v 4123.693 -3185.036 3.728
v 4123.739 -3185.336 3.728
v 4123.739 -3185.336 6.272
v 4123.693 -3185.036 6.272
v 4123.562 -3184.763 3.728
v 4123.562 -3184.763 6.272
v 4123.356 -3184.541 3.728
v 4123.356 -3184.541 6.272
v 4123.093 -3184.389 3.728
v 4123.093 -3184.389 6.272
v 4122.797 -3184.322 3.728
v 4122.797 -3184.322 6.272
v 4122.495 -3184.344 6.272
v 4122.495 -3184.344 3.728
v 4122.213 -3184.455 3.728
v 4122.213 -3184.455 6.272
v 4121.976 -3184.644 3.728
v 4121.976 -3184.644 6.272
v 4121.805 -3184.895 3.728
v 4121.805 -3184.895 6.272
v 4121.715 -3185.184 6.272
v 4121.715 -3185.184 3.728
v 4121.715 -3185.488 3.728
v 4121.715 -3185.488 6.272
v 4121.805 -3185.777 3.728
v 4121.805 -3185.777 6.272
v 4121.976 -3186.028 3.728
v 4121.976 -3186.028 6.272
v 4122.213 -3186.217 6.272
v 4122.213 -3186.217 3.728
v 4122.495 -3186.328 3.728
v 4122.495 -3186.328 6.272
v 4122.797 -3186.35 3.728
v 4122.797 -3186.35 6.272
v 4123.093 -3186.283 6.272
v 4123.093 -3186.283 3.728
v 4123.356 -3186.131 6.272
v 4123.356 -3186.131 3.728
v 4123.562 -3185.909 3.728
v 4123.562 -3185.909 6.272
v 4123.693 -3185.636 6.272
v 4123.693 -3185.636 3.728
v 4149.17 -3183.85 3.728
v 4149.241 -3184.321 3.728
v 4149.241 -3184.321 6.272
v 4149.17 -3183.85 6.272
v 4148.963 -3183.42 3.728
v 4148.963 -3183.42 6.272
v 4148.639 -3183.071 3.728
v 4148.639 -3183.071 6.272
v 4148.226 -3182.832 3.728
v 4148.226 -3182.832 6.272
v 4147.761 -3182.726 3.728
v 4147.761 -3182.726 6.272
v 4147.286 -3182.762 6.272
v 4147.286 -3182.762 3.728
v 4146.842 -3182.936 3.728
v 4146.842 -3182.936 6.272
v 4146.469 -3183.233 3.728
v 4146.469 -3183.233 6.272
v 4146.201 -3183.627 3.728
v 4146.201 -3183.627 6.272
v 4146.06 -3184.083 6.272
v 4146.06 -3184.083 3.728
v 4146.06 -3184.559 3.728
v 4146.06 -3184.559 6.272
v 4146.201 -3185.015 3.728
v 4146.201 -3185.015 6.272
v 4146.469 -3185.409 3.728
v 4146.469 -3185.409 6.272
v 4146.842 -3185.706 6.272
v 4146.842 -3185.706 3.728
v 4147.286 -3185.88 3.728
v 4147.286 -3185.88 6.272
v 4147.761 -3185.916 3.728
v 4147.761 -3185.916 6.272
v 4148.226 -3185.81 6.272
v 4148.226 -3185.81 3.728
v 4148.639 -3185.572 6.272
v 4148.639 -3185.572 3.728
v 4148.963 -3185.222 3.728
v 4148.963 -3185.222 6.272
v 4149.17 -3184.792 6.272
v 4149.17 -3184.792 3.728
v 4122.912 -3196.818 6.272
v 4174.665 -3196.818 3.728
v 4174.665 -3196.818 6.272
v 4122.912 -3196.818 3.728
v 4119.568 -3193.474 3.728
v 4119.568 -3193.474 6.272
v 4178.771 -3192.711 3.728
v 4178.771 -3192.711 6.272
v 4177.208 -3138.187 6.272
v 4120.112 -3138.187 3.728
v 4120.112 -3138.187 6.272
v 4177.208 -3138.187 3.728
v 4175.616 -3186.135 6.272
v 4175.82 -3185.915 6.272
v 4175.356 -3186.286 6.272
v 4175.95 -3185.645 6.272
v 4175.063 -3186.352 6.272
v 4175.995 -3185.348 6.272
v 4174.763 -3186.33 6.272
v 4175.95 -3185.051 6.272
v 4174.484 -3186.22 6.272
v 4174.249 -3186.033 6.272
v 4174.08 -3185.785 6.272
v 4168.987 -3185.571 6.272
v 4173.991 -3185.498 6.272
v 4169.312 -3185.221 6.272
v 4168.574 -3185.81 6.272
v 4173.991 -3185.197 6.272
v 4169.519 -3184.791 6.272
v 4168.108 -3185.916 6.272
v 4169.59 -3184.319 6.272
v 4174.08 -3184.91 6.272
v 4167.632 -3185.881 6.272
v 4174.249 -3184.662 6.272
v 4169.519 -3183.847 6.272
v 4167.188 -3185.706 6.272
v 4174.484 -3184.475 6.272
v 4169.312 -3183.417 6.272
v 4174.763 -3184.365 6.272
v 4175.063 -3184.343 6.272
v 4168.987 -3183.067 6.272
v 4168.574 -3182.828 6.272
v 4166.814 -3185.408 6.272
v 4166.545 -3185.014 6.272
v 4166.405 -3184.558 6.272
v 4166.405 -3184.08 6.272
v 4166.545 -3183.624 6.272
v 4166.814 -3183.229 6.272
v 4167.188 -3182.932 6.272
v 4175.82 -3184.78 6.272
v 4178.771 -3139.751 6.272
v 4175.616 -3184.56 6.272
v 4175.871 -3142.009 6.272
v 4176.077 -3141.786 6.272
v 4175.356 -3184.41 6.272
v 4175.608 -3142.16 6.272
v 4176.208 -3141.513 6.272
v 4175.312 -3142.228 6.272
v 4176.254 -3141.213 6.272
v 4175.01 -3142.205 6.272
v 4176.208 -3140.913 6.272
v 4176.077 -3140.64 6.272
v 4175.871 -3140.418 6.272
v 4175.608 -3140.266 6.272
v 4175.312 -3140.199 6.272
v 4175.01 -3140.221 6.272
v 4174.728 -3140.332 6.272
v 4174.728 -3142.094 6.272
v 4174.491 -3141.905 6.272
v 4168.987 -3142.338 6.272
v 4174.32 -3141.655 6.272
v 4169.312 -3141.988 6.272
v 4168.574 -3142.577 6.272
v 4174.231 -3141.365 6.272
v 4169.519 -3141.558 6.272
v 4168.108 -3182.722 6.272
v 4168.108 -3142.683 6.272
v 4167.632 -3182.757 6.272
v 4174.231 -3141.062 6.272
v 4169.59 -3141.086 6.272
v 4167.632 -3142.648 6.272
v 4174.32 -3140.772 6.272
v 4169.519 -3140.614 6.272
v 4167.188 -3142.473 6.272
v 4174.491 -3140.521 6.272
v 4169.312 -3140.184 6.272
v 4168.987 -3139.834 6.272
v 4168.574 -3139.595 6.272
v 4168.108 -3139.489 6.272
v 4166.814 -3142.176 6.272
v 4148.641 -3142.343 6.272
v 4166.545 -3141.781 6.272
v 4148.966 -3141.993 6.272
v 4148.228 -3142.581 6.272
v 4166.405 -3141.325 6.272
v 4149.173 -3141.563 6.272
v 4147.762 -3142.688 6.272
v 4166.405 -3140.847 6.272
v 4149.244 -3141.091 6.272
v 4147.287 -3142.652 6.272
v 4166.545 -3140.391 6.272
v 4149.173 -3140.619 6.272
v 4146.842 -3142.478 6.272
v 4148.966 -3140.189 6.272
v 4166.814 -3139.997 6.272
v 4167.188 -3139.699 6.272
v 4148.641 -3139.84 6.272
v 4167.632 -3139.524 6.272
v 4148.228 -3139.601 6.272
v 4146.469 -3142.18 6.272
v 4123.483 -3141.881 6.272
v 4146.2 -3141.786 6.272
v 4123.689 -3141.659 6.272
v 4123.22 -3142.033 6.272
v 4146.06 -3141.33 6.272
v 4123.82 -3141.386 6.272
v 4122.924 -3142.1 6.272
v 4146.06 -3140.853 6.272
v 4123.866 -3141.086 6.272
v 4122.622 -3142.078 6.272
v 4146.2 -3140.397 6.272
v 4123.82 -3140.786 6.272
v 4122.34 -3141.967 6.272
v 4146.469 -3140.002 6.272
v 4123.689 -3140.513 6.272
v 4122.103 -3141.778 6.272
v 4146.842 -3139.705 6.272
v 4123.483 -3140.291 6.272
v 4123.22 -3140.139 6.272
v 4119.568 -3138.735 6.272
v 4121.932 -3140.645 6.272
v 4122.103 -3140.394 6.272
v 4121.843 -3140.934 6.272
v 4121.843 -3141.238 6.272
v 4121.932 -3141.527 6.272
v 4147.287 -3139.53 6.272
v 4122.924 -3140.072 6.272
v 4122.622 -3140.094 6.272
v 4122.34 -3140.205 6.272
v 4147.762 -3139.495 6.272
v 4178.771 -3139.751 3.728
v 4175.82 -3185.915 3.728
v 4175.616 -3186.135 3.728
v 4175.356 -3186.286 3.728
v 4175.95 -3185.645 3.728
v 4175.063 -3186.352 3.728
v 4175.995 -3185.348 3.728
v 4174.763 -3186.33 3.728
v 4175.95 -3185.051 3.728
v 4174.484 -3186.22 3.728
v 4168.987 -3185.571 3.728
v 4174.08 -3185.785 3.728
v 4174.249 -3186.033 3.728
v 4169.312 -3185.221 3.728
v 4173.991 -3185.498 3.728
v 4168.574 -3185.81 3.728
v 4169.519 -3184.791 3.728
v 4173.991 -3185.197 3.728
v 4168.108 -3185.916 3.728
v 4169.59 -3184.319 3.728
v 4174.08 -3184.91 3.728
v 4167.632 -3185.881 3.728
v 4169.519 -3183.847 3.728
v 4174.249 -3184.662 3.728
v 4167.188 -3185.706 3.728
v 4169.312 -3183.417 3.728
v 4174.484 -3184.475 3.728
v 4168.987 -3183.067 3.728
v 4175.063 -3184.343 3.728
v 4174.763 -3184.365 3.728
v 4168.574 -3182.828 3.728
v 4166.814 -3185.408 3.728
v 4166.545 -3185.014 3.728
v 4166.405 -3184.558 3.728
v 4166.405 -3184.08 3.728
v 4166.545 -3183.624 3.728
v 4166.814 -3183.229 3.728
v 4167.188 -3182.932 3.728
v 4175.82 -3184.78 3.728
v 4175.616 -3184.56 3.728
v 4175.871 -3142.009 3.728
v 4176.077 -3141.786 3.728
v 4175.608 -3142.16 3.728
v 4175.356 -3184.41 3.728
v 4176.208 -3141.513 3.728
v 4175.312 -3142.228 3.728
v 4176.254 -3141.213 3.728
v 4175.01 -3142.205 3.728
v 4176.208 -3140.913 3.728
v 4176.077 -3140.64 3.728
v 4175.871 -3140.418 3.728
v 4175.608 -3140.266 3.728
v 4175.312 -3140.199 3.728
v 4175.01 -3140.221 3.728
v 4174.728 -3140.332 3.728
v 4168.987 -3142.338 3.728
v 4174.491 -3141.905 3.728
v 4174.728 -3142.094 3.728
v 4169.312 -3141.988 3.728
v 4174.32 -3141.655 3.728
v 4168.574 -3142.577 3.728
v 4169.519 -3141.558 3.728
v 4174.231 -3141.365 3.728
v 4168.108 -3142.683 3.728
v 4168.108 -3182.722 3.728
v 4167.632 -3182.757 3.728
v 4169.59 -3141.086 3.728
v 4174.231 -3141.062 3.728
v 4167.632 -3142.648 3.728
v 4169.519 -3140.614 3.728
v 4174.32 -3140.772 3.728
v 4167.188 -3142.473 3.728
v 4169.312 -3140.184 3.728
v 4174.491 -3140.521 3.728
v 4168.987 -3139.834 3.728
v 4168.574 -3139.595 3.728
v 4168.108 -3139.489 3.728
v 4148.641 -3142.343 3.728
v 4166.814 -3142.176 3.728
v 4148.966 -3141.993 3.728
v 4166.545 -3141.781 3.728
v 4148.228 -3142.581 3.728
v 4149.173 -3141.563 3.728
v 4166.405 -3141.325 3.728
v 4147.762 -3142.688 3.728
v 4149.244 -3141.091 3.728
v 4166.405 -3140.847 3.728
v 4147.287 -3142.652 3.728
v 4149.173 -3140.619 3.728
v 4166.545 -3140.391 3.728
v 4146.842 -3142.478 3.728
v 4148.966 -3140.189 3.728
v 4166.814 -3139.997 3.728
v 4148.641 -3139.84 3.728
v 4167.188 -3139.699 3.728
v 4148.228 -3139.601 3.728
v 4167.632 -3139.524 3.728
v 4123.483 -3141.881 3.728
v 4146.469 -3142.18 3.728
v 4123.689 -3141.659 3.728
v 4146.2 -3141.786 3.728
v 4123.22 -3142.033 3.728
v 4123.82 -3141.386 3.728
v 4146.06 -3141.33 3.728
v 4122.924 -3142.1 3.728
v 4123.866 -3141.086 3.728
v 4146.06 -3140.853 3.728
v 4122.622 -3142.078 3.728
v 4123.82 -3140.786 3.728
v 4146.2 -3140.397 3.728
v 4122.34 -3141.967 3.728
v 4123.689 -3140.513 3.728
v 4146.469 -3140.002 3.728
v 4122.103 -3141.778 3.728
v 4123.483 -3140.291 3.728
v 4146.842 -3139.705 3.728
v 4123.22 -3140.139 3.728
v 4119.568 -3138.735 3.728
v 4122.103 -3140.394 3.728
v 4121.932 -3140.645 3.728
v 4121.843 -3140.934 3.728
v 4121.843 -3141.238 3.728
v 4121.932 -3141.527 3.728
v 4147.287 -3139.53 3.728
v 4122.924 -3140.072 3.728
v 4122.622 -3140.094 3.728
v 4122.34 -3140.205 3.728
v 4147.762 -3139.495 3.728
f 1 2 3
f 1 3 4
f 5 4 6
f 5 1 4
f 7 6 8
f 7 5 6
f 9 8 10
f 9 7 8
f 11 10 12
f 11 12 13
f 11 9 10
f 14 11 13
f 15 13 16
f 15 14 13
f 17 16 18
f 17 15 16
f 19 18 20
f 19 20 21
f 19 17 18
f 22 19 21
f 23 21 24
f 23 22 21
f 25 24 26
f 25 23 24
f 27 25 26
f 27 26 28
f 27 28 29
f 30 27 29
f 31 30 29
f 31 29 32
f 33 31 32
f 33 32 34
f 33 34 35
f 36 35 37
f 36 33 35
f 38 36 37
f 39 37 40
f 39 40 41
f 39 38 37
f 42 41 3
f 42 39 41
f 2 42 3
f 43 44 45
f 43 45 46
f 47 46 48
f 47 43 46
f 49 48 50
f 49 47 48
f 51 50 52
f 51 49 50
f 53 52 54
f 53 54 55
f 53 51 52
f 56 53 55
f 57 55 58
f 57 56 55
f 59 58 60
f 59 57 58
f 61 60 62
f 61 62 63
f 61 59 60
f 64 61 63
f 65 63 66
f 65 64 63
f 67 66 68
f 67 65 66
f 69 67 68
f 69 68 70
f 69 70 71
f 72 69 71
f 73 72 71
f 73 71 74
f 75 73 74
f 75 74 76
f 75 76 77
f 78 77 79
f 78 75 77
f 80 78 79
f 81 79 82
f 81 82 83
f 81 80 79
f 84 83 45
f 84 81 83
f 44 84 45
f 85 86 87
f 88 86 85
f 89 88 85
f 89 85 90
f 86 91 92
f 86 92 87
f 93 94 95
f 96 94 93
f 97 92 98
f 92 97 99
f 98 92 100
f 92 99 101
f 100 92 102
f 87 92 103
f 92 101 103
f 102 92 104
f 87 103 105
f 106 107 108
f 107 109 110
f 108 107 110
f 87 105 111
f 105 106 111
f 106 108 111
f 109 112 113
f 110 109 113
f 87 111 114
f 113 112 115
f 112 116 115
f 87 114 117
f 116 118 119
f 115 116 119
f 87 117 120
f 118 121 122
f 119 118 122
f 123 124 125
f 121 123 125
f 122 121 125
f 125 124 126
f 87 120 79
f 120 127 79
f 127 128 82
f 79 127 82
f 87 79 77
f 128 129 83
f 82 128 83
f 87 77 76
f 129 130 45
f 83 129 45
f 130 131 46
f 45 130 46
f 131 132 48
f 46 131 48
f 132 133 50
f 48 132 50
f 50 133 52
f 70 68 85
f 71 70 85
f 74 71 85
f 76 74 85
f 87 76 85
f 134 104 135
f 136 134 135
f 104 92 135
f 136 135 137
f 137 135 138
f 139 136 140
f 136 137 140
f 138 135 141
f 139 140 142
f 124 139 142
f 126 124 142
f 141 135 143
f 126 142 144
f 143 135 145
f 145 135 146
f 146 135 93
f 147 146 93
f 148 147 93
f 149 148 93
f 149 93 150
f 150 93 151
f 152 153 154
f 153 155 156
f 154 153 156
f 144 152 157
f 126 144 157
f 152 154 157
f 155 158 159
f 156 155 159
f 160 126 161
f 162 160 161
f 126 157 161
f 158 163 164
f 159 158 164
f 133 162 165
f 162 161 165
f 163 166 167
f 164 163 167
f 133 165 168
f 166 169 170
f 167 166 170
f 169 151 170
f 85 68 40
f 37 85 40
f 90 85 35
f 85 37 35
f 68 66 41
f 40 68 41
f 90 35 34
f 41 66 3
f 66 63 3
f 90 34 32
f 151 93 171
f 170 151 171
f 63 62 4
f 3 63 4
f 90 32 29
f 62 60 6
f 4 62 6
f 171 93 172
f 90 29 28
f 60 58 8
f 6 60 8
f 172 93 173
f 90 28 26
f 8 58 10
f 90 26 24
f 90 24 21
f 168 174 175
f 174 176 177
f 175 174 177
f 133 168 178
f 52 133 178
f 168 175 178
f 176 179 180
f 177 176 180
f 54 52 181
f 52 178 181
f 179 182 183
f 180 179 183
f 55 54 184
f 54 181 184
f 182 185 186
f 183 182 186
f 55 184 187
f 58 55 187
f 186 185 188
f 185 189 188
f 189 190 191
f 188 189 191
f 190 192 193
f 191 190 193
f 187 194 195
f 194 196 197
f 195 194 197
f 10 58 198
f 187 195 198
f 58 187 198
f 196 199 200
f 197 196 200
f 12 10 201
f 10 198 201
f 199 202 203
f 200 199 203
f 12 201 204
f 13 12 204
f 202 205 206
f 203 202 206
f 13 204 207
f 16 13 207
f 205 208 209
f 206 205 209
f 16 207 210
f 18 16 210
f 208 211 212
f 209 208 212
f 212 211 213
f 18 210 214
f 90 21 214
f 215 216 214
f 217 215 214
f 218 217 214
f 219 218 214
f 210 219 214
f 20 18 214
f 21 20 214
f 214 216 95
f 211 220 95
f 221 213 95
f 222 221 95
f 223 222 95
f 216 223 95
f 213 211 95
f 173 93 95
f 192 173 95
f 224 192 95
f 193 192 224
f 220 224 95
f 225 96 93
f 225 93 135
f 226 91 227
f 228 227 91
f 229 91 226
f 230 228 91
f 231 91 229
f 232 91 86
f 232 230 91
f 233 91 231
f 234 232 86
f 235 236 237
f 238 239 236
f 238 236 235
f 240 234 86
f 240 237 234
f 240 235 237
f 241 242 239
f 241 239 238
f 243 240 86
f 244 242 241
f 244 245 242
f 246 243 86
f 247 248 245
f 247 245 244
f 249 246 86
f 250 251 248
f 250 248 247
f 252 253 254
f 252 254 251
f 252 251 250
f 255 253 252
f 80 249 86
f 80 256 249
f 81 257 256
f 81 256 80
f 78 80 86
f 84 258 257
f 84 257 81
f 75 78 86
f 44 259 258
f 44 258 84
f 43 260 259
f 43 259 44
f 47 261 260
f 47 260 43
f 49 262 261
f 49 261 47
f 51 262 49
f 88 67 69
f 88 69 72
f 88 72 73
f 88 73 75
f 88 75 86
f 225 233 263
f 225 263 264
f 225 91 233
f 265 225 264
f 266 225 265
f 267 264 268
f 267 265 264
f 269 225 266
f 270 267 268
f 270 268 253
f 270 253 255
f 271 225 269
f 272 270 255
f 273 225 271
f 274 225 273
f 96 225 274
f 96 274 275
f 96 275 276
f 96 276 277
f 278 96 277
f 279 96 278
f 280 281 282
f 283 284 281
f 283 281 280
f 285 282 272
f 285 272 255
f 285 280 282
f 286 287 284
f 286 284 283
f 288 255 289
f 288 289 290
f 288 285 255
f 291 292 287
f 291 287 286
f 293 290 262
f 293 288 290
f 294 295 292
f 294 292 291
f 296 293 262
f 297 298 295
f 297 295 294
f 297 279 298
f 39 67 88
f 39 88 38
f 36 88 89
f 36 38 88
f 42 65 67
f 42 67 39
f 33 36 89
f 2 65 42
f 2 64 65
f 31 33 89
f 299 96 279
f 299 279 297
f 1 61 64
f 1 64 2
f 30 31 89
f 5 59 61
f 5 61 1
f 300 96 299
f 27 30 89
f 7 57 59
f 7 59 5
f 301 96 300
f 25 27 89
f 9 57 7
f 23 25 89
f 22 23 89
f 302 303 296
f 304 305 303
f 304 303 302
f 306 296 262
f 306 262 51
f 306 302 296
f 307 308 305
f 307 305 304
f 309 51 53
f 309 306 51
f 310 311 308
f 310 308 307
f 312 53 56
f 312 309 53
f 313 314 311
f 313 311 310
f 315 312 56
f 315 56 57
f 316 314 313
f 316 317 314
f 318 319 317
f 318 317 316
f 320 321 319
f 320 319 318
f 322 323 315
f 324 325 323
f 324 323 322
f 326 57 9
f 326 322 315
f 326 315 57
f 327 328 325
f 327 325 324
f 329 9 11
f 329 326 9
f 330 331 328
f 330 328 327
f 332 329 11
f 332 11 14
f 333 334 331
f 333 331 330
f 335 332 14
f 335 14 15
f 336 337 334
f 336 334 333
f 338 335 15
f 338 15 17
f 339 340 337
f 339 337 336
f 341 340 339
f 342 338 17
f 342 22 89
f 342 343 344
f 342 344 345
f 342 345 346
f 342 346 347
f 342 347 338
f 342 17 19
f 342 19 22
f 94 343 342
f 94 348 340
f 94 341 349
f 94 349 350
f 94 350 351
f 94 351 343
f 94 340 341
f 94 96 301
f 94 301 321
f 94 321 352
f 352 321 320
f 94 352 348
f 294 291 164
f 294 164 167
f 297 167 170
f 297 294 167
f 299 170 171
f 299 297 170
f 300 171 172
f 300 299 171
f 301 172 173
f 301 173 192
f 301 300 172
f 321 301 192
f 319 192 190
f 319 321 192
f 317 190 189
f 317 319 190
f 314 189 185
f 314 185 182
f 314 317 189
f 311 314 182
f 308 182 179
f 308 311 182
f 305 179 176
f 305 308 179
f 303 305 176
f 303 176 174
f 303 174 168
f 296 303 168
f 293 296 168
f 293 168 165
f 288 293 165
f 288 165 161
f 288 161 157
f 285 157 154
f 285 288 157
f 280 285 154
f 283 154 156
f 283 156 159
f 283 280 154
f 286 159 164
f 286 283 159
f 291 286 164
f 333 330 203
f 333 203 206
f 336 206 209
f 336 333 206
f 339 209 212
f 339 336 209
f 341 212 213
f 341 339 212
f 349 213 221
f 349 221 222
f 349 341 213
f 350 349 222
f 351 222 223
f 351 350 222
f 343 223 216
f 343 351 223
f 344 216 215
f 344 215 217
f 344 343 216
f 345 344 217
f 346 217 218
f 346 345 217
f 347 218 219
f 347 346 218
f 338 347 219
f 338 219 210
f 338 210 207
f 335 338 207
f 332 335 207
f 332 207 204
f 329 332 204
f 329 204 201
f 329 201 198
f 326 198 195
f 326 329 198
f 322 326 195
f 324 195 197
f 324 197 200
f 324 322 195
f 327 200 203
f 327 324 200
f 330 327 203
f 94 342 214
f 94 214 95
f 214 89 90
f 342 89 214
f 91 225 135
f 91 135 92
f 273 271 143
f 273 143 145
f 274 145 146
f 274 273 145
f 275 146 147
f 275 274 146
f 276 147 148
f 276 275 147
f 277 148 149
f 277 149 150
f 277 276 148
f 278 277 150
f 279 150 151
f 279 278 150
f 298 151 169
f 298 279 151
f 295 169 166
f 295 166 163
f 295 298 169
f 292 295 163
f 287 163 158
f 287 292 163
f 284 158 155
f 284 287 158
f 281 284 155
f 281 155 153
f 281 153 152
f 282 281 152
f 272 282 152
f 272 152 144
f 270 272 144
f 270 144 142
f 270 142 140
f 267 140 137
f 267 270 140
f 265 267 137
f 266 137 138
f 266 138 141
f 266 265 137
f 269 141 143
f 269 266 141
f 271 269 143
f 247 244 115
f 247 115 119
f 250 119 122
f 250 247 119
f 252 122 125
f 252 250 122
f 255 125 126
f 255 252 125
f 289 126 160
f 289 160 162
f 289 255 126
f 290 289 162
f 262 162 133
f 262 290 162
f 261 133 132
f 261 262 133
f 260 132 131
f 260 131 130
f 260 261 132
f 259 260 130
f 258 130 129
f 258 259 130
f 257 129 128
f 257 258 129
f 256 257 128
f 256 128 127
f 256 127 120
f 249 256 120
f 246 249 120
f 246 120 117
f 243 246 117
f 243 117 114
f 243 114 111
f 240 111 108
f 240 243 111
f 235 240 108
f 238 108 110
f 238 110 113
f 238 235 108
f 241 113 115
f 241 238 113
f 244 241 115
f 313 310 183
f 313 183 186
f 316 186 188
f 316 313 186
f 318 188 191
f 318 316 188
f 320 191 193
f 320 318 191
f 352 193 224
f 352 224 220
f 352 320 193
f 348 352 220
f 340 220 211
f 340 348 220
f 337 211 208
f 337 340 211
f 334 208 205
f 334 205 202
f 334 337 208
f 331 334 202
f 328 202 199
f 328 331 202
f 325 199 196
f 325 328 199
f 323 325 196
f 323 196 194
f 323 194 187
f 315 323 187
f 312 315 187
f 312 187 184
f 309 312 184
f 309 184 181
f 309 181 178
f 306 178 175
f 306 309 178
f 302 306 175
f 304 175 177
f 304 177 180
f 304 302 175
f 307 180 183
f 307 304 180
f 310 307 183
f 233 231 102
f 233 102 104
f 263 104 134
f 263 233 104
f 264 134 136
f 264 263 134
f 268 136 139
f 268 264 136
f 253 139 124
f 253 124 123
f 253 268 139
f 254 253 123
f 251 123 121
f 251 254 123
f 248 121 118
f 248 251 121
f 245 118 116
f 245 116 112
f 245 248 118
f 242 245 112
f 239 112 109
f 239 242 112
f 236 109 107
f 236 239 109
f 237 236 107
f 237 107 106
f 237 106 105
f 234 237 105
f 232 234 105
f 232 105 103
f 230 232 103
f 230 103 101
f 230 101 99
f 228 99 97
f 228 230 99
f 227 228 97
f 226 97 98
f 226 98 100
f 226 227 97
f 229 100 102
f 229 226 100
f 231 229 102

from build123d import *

# Parameters (mm, degrees)
SKETCH1_R           = 4.000005254
SKETCH1_R_2         = 6.295294196
SKETCH1_R_3         = 6.298818985
SKETCH1_R_4         = 4.000046515
SKETCH1_R_5         = 3.96227159
SKETCH1_R_6         = 6.298583834
SKETCH1_R_7         = 6.289262296
SKETCH1_R_8         = 4.000026217
BOSS_EXTRUDE1_DEPTH = 10
SCALE1_SCALE        = 0.254310345


with BuildPart() as part:
    # Sketch1 → Boss-Extrude1 (new body)
    with BuildSketch(Plane.XY):
        Polygon((4033.100097656, -3054.507080078), (4035.240234375, -3052.350097656), (4259.751464844, -3052.350097656), (4265.899902344, -3058.498535156), (4265.899902344, -3266.751464844), (4249.751464844, -3282.899902344), (4046.248535156, -3282.899902344), (4033.100097656, -3269.751464844), align=None)
        with Locations((4046.000008659, -3063.7500542)):
            Circle(SKETCH1_R, mode=Mode.SUBTRACT)
        with Locations((4143.496433826, -3063.770149106)):
            Circle(SKETCH1_R_2, mode=Mode.SUBTRACT)
        with Locations((4223.5, -3063.750049197)):
            Circle(SKETCH1_R_3, mode=Mode.SUBTRACT)
        with Locations((4252.000063875, -3064.25000712)):
            Circle(SKETCH1_R_4, mode=Mode.SUBTRACT)
        with Locations((4251.021334492, -3237.795441039)):
            Circle(SKETCH1_R_5, mode=Mode.SUBTRACT)
        with Locations((4223.5, -3233.750415039)):
            Circle(SKETCH1_R_6, mode=Mode.SUBTRACT)
        with Locations((4143.493016467, -3233.75871347)):
            Circle(SKETCH1_R_7, mode=Mode.SUBTRACT)
        with Locations((4045.500040954, -3237.749996915)):
            Circle(SKETCH1_R_8, mode=Mode.SUBTRACT)
    extrude(amount=BOSS_EXTRUDE1_DEPTH)


with BuildPart() as part_1:
    # Scale1: scaled about (4149.056874209, -3167.460792727, 5)
    add(part.part.scale(SCALE1_SCALE).moved(Location((3093.90878982, -2361.942746301, 3.728448276))))


solid = part_1.part
